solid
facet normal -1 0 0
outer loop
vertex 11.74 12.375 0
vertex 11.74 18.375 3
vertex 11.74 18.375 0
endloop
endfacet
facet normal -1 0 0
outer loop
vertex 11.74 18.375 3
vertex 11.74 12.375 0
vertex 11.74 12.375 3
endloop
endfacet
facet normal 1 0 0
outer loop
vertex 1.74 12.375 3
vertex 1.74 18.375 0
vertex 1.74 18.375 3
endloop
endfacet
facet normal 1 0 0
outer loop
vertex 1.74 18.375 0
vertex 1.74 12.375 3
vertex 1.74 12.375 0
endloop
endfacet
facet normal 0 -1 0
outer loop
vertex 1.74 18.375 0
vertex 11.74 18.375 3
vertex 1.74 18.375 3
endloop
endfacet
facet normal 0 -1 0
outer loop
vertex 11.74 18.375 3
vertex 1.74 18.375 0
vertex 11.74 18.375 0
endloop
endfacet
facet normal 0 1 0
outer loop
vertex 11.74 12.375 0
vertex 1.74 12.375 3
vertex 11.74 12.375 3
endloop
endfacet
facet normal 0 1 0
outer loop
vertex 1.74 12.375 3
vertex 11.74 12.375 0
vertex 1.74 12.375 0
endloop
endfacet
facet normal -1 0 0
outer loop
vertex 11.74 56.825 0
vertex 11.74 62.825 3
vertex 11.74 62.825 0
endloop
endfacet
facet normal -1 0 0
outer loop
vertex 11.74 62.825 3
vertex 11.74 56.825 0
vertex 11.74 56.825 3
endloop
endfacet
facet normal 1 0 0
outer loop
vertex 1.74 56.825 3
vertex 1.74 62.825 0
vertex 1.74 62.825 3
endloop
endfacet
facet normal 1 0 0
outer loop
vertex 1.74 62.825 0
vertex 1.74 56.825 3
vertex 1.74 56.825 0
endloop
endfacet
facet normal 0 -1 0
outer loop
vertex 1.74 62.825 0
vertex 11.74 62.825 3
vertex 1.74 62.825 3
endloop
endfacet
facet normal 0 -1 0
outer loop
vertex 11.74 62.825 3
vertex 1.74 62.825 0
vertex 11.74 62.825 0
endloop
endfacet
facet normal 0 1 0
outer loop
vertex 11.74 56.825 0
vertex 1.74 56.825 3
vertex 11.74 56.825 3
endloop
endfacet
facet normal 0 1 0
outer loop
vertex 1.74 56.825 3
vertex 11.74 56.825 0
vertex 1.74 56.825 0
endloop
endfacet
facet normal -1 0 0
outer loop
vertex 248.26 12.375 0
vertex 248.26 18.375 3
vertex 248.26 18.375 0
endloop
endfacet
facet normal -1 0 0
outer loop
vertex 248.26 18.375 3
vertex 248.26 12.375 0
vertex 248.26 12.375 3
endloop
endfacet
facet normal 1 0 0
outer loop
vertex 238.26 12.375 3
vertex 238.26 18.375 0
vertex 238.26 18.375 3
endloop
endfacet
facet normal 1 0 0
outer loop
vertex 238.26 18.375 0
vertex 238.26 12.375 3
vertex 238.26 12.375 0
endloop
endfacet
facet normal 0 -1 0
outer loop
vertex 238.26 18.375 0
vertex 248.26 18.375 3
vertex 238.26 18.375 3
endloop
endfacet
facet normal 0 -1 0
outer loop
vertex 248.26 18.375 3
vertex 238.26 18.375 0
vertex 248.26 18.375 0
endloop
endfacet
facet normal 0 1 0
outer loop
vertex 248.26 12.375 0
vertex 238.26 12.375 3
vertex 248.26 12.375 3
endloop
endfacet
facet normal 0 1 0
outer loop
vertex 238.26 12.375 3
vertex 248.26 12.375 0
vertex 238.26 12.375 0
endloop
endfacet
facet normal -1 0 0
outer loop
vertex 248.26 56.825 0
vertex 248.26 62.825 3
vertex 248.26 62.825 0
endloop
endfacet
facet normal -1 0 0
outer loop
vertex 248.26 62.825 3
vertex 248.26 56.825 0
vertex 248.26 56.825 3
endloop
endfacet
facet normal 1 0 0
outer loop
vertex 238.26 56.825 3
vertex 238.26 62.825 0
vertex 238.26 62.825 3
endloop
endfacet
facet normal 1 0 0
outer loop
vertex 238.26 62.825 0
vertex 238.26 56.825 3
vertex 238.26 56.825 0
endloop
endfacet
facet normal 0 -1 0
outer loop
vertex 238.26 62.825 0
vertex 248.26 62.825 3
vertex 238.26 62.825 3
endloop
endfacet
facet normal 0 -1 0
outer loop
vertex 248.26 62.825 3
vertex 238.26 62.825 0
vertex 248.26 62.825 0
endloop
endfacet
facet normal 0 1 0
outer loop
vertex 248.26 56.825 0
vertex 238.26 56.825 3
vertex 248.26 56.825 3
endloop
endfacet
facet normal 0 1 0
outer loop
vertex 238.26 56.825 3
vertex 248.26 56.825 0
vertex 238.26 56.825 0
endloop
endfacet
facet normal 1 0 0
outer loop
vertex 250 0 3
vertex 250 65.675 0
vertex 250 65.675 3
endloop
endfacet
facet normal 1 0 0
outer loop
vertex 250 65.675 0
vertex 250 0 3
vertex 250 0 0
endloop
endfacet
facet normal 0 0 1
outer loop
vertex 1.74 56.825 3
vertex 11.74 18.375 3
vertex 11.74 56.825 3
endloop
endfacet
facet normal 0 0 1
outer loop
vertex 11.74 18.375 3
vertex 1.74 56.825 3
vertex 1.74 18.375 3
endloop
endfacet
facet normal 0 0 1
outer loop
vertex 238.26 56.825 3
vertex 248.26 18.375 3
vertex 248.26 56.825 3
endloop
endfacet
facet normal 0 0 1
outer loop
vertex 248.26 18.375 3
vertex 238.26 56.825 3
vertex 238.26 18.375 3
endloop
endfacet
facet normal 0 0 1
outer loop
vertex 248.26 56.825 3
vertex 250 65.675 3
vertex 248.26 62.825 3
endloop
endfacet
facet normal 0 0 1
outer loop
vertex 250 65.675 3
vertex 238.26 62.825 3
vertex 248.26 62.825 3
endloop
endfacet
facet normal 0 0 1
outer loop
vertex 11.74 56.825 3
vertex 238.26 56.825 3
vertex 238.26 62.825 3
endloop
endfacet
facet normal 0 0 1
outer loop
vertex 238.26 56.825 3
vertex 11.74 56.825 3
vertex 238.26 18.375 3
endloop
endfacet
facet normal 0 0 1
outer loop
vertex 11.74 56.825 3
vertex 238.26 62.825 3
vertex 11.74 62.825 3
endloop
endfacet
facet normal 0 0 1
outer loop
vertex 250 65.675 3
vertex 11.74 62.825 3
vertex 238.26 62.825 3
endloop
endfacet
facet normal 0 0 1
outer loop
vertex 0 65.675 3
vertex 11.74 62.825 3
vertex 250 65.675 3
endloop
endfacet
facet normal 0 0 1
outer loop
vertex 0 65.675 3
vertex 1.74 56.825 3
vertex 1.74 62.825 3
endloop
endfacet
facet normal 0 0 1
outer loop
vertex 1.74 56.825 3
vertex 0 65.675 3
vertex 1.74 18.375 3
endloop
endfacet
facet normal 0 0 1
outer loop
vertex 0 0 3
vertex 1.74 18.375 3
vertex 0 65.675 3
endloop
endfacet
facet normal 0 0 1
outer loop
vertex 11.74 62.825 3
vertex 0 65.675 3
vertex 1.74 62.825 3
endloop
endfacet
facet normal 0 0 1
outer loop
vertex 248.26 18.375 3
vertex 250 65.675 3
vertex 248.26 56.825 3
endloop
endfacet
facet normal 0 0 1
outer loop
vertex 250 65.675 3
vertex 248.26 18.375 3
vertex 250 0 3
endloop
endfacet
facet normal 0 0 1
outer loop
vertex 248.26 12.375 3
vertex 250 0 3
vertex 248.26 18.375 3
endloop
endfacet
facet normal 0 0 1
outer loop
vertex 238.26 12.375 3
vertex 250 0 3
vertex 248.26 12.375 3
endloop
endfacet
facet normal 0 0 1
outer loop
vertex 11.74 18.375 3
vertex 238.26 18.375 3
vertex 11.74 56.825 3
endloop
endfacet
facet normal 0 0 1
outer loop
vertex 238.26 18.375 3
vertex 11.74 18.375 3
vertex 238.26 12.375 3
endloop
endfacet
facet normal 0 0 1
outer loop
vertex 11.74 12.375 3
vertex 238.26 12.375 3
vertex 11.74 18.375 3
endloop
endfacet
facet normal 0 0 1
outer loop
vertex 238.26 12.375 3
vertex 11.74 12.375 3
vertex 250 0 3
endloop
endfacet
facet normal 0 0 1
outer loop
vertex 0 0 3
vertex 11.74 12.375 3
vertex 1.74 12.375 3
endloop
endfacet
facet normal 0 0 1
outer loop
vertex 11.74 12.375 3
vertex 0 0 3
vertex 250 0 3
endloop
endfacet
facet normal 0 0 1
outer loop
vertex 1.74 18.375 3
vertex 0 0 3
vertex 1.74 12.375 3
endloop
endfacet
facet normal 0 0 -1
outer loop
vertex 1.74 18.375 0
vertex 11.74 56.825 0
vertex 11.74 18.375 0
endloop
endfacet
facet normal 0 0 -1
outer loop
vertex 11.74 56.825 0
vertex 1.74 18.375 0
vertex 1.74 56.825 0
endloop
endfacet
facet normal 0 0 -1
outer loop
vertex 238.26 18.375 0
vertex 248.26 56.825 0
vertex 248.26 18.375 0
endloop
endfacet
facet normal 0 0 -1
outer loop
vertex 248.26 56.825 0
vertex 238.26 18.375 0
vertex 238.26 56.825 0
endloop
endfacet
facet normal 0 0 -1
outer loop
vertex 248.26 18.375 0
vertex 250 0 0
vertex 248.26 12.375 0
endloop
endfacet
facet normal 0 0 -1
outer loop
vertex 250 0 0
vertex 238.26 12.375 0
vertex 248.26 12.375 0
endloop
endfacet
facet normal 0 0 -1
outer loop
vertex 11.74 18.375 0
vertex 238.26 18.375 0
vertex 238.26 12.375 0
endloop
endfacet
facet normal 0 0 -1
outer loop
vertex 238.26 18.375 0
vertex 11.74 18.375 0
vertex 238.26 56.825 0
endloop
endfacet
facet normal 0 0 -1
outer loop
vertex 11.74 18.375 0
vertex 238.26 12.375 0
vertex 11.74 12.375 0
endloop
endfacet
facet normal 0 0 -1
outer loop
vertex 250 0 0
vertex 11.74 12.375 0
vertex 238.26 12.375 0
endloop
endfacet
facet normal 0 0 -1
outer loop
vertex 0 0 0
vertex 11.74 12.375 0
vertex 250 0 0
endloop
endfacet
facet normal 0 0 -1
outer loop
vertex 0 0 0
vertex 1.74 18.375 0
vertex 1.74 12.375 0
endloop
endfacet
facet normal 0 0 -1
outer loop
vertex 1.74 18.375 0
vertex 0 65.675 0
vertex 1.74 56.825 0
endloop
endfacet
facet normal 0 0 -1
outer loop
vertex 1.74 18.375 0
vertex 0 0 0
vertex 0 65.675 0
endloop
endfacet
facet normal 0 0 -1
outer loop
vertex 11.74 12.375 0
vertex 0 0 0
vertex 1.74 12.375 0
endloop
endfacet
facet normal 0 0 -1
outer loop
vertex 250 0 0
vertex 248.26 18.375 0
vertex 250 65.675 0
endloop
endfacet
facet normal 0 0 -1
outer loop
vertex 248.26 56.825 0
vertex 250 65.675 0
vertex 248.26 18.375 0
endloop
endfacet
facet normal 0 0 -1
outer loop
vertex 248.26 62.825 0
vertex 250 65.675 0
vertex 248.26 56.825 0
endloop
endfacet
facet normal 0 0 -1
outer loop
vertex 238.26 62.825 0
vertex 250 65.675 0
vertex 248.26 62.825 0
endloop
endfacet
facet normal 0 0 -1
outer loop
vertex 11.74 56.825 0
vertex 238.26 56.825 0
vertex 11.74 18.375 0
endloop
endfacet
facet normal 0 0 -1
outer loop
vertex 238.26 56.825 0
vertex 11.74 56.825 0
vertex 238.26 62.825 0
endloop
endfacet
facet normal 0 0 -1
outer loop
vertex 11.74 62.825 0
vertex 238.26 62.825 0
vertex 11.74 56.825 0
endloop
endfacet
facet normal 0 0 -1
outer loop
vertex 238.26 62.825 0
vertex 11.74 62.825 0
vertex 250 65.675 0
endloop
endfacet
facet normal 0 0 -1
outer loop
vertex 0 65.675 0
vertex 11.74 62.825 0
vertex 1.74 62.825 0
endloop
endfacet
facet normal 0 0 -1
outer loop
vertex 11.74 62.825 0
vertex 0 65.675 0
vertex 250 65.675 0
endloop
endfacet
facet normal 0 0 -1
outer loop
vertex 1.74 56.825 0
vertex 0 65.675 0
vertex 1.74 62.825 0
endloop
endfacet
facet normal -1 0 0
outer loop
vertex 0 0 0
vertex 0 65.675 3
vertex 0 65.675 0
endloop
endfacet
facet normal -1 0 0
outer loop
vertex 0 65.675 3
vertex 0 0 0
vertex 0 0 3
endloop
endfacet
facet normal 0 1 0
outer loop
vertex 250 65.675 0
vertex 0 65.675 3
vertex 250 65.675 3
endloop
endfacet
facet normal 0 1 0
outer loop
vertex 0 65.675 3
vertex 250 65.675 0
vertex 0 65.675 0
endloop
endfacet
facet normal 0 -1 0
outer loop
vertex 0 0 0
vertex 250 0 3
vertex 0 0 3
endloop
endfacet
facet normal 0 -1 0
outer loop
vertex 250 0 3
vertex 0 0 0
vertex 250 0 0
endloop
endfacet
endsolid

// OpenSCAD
// TL1_Plate_1p5U_Shifted_0p5U
// Homelab Rack CAD Standard v1.0 - millimeters
// Mount positions provisional: test-fit against DeskPi TL1 rail!
plate_width=250;
plate_height=65.675;
plate_thickness=3;
slot_width=10;
slot_height=6;
slot_x=[6.74,243.26];
slot_y=[15.375,59.825];
difference() {
  cube([plate_width,plate_height,plate_thickness]);
  for (x=slot_x) for (y=slot_y)
    translate([x-slot_width/2,y-slot_height/2,-0.5])
      cube([slot_width,slot_height,plate_thickness+1]);
}
